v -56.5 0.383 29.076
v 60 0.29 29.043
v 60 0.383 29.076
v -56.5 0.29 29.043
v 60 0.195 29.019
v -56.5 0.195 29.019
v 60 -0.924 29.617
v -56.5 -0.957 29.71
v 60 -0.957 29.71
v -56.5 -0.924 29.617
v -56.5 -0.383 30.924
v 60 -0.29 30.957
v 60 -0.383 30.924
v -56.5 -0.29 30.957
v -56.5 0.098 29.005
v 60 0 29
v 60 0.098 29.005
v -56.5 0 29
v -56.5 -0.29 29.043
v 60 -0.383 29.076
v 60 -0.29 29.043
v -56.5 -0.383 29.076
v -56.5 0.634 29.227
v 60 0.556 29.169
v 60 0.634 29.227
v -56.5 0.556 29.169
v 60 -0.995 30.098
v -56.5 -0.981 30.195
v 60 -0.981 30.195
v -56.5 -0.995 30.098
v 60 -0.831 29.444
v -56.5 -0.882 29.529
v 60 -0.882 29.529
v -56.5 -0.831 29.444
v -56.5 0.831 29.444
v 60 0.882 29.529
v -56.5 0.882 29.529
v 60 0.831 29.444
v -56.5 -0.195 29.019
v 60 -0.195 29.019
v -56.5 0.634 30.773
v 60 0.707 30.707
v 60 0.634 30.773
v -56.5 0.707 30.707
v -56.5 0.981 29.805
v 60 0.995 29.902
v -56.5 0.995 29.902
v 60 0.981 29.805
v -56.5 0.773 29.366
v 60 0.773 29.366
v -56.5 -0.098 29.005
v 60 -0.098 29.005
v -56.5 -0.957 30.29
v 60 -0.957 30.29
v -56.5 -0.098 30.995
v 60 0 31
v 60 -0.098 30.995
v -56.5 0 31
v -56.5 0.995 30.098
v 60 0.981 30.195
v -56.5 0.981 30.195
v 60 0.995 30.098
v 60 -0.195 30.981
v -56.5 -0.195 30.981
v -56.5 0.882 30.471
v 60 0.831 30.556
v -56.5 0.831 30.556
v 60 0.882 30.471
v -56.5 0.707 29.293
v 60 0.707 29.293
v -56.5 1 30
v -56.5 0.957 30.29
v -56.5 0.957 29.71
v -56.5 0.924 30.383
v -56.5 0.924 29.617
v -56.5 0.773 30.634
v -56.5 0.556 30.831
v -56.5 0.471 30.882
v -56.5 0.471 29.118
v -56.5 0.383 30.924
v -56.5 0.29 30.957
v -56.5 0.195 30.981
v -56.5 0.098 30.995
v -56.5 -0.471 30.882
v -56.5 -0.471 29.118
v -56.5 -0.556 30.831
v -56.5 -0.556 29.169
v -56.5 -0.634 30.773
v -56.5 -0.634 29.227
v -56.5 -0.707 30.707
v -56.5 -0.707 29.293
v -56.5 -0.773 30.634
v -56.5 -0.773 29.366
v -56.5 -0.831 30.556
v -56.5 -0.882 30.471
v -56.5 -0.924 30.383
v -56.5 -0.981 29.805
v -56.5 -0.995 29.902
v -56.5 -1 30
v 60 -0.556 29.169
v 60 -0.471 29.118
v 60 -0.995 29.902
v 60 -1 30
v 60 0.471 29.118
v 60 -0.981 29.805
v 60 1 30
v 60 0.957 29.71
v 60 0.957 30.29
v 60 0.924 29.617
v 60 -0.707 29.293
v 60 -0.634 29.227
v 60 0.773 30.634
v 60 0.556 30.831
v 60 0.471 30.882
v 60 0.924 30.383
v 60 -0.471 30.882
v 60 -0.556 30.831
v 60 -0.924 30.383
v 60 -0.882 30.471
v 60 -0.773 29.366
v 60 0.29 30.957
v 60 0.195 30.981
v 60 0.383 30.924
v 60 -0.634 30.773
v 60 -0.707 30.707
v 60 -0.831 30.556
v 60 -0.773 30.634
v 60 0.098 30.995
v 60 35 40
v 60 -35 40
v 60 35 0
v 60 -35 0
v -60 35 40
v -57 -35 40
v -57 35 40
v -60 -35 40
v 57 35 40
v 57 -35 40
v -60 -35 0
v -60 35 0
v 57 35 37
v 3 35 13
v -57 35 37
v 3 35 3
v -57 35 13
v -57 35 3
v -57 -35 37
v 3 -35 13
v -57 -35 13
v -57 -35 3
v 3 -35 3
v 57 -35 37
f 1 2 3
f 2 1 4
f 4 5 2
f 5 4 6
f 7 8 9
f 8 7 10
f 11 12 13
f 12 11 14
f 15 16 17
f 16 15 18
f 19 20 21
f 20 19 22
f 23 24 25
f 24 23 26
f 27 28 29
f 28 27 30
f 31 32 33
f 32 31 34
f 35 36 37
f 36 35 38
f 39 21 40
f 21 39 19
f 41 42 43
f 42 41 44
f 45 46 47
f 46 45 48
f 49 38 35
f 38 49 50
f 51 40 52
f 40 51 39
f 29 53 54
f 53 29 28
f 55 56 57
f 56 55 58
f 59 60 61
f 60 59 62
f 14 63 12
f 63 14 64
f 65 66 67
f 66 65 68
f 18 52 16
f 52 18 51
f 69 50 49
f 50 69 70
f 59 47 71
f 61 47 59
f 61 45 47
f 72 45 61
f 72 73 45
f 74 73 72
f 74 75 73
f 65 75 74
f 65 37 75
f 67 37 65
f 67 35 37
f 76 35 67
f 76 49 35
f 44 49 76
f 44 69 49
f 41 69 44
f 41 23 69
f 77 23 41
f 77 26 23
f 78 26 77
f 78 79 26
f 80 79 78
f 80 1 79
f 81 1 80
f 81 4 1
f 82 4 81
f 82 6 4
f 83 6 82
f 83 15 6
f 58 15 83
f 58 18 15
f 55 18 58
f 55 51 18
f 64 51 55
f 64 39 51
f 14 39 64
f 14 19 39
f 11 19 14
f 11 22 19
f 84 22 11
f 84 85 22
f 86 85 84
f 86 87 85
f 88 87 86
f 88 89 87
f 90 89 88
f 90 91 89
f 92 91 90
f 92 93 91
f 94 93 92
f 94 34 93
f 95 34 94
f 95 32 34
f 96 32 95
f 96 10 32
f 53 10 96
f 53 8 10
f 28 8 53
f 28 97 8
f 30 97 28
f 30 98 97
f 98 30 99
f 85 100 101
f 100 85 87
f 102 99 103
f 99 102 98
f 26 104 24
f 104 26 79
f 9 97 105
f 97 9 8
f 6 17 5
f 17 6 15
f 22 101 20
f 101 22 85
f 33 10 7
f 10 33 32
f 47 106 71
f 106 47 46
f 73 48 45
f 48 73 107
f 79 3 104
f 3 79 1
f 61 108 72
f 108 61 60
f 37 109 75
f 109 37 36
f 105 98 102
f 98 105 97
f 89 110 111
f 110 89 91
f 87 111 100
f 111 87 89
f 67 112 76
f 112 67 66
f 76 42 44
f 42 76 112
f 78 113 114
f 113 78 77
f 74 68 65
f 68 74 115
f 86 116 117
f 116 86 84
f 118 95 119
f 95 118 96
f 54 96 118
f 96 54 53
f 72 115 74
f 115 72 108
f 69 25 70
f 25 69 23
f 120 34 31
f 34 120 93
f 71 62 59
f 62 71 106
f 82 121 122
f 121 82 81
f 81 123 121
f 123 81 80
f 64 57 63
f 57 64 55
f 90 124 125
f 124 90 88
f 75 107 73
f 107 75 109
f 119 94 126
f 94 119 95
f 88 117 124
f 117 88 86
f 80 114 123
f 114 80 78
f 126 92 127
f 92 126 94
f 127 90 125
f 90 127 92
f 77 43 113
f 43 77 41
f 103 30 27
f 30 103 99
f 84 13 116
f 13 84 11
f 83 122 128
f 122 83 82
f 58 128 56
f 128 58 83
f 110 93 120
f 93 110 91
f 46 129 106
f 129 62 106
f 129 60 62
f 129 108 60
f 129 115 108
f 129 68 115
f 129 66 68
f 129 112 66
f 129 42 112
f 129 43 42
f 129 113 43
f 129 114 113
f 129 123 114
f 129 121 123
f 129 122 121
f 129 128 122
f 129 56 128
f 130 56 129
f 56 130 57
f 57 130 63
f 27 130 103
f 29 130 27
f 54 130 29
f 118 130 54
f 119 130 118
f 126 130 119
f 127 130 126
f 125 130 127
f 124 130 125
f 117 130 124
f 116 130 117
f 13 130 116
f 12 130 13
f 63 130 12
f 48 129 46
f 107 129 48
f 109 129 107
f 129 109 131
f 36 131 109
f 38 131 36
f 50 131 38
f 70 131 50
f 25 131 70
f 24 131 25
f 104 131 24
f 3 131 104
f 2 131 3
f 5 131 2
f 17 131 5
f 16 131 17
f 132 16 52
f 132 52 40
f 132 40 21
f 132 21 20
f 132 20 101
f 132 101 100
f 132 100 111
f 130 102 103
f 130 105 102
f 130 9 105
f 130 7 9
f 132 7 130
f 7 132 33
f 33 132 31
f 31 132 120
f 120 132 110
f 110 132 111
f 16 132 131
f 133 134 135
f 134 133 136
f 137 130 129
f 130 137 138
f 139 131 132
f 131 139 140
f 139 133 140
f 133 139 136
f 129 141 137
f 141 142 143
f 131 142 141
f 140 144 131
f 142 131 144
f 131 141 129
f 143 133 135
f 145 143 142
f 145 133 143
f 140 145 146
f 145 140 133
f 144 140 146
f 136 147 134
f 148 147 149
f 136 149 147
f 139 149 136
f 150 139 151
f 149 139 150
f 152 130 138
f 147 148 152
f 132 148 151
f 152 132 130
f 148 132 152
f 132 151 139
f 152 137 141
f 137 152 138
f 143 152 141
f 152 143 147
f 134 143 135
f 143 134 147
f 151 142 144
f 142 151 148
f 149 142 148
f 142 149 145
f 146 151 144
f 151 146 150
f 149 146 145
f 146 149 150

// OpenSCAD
// Mini horizontal gel-electrophoresis box - buffer tank
// Print orientation: tank resting on XY plane, open top facing +Z

// ---------- Parameters ----------
outer_x      = 120;   // outer length in X (mm)
outer_y      = 70;    // outer width in Y (mm)
outer_z      = 40;    // outer height in Z (mm)
wall         = 3;     // wall thickness (mm)
floor        = 3;     // floor thickness (mm)
platform_x   = 60;    // platform length in X (mm)
platform_y   = outer_y; // platform spans full inner width (mm)
platform_top = 13;    // platform top height above outer bottom (mm)
hole_d       = 2;     // electrode hole diameter (mm)
hole_y       = 0;     // electrode hole Y position (mm)
hole_z       = 30;    // electrode hole Z position (mm)
eps          = 0.5;   // cutter overshoot past faces (mm)

$fn = 64;

// ---------- Derived ----------
inner_x = outer_x - 2 * wall;   // 114 mm
inner_z = outer_z - floor;      // 37 mm (floor at z = 0..3)

// ---------- Model ----------
difference() {
    // Tank body
    translate([-outer_x / 2, -outer_y / 2, 0])
        cube([outer_x, outer_y, outer_z]);

    // Open top (empty space above inner floor)
    translate([-inner_x / 2, -platform_y / 2, inner_z])
        cube([inner_x, platform_y, outer_z - inner_z + eps]);

    // Raised gel-tray platform
    translate([-inner_x / 2, -platform_y / 2, floor])
        cube([platform_x, platform_y, platform_top - floor]);

    // Electrode holes through end walls, along X
    for (sx = [-1, 1])
        translate([sx * (inner_x / 2 - eps), hole_y, hole_z])
            rotate([0, 90, 0])
                cylinder(d = hole_d, h = inner_x + 2 * eps);
}
